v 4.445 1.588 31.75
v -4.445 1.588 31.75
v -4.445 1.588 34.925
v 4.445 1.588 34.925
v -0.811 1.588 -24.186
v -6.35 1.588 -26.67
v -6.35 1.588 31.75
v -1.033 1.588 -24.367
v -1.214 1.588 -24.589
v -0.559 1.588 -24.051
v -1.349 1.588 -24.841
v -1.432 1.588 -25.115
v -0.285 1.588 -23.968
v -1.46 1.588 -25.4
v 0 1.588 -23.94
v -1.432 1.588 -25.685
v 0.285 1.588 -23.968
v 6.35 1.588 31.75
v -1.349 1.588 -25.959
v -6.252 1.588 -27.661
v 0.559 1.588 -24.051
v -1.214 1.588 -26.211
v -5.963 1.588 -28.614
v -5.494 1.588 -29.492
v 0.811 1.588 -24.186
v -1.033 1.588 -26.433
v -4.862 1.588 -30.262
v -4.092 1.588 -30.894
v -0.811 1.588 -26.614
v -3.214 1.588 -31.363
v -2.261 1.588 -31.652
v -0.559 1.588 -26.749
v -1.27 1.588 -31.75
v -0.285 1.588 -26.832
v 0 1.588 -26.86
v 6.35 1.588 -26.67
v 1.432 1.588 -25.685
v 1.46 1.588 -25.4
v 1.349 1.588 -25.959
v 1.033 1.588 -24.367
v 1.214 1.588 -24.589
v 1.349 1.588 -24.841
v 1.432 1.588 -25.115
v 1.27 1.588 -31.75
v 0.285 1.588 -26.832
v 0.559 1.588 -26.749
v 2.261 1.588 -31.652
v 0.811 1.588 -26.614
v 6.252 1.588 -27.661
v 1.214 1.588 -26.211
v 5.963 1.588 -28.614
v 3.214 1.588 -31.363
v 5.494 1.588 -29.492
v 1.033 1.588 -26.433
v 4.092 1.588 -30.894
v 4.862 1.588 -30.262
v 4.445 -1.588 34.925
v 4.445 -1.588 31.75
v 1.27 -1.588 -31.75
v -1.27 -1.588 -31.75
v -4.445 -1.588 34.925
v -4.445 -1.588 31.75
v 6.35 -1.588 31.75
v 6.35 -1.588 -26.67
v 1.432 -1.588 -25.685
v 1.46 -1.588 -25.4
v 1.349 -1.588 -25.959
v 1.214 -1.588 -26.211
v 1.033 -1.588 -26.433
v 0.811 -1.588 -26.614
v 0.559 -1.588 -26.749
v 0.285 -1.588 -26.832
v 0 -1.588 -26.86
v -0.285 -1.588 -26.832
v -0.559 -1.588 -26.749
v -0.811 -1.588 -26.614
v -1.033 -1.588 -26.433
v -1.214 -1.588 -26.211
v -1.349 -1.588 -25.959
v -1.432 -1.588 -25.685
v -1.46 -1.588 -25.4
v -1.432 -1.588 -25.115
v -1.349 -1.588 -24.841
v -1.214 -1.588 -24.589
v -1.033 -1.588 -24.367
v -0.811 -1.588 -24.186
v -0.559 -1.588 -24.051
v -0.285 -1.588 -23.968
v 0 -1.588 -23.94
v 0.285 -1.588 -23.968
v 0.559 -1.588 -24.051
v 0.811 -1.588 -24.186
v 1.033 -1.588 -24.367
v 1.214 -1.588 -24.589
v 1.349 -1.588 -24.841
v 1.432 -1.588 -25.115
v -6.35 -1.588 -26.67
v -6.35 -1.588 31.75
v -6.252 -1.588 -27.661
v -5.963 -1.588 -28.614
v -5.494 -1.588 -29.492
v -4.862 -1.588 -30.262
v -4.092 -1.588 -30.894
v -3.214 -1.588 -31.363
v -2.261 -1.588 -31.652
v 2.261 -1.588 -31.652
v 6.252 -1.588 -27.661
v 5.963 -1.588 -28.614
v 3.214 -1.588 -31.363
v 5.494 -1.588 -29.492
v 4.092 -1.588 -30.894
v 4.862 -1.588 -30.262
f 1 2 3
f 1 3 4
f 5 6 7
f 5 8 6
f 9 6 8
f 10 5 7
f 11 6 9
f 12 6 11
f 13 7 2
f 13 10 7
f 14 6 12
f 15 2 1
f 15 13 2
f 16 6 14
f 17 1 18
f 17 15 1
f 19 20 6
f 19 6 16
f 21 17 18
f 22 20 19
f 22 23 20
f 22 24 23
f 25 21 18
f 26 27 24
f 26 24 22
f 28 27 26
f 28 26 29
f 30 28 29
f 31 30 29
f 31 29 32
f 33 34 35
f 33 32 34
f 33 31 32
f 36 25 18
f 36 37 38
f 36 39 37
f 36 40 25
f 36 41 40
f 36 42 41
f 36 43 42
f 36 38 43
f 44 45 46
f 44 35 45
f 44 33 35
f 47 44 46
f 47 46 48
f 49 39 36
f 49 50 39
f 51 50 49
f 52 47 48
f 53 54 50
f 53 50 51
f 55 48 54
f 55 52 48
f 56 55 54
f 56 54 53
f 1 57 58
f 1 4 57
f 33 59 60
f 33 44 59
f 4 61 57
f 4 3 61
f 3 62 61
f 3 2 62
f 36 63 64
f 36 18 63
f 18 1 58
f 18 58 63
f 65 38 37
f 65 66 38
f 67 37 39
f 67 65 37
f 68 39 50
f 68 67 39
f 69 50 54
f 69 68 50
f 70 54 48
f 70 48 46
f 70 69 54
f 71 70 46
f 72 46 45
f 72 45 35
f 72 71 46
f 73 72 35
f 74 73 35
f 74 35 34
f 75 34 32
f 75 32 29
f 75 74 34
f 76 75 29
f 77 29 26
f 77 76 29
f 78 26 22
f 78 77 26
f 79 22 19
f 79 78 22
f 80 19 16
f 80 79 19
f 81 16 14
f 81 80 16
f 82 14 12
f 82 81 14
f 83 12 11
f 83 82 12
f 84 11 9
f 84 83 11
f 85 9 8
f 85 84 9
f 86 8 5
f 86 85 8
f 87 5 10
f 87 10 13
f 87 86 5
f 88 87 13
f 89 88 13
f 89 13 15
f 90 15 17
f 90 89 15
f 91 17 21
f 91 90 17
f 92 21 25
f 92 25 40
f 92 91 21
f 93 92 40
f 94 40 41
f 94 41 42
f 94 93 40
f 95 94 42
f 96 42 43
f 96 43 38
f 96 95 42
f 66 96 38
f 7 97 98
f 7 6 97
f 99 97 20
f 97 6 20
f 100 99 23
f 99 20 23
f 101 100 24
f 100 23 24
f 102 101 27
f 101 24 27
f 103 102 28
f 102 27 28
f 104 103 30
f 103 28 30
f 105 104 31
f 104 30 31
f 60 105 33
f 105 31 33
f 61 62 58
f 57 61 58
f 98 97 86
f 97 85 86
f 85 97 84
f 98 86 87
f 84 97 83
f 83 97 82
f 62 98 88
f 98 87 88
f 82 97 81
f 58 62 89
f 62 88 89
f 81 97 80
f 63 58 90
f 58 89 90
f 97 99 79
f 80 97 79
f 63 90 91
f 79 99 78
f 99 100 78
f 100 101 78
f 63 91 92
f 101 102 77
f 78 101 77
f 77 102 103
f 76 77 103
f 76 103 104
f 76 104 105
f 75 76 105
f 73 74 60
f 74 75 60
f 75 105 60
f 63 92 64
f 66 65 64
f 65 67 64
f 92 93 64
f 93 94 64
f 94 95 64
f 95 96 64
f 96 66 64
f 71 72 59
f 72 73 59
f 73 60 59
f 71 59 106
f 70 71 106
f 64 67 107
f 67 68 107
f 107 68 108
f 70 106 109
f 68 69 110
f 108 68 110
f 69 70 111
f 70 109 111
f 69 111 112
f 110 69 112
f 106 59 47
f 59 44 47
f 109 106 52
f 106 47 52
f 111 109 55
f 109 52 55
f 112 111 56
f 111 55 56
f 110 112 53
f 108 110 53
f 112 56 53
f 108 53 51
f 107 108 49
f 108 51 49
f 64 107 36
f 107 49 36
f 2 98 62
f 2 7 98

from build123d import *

# Parameters (mm, degrees)
SKETCH2_R           = 1.4605
BOSS_EXTRUDE1_DEPTH = 1.5875
FILLET1_R           = 5.08


with BuildPart() as part:
    # Sketch2 → Boss-Extrude1 (new body, symmetric)
    with BuildSketch(Plane(origin=(0, 0, 0), x_dir=(1, 0, 0), z_dir=(0, 1, 0))):
        Polygon((4.445, -34.925), (4.445, -31.75), (6.35, -31.75), (6.35, 31.75), (-6.35, 31.75), (-6.35, -31.75), (-4.445, -31.75), (-4.445, -34.925), align=None)
        with Locations((0, 25.4)):
            Circle(SKETCH2_R, mode=Mode.SUBTRACT)
    extrude(amount=BOSS_EXTRUDE1_DEPTH, both=True)

    # Fillet1
    fillet1_edges = [part.edges().sort_by_distance(p)[0] for p in [
        (6.35, 0, -31.75),
        (-6.35, 0, -31.75),
    ]]
    fillet(fillet1_edges, radius=FILLET1_R)


solid = part.part
